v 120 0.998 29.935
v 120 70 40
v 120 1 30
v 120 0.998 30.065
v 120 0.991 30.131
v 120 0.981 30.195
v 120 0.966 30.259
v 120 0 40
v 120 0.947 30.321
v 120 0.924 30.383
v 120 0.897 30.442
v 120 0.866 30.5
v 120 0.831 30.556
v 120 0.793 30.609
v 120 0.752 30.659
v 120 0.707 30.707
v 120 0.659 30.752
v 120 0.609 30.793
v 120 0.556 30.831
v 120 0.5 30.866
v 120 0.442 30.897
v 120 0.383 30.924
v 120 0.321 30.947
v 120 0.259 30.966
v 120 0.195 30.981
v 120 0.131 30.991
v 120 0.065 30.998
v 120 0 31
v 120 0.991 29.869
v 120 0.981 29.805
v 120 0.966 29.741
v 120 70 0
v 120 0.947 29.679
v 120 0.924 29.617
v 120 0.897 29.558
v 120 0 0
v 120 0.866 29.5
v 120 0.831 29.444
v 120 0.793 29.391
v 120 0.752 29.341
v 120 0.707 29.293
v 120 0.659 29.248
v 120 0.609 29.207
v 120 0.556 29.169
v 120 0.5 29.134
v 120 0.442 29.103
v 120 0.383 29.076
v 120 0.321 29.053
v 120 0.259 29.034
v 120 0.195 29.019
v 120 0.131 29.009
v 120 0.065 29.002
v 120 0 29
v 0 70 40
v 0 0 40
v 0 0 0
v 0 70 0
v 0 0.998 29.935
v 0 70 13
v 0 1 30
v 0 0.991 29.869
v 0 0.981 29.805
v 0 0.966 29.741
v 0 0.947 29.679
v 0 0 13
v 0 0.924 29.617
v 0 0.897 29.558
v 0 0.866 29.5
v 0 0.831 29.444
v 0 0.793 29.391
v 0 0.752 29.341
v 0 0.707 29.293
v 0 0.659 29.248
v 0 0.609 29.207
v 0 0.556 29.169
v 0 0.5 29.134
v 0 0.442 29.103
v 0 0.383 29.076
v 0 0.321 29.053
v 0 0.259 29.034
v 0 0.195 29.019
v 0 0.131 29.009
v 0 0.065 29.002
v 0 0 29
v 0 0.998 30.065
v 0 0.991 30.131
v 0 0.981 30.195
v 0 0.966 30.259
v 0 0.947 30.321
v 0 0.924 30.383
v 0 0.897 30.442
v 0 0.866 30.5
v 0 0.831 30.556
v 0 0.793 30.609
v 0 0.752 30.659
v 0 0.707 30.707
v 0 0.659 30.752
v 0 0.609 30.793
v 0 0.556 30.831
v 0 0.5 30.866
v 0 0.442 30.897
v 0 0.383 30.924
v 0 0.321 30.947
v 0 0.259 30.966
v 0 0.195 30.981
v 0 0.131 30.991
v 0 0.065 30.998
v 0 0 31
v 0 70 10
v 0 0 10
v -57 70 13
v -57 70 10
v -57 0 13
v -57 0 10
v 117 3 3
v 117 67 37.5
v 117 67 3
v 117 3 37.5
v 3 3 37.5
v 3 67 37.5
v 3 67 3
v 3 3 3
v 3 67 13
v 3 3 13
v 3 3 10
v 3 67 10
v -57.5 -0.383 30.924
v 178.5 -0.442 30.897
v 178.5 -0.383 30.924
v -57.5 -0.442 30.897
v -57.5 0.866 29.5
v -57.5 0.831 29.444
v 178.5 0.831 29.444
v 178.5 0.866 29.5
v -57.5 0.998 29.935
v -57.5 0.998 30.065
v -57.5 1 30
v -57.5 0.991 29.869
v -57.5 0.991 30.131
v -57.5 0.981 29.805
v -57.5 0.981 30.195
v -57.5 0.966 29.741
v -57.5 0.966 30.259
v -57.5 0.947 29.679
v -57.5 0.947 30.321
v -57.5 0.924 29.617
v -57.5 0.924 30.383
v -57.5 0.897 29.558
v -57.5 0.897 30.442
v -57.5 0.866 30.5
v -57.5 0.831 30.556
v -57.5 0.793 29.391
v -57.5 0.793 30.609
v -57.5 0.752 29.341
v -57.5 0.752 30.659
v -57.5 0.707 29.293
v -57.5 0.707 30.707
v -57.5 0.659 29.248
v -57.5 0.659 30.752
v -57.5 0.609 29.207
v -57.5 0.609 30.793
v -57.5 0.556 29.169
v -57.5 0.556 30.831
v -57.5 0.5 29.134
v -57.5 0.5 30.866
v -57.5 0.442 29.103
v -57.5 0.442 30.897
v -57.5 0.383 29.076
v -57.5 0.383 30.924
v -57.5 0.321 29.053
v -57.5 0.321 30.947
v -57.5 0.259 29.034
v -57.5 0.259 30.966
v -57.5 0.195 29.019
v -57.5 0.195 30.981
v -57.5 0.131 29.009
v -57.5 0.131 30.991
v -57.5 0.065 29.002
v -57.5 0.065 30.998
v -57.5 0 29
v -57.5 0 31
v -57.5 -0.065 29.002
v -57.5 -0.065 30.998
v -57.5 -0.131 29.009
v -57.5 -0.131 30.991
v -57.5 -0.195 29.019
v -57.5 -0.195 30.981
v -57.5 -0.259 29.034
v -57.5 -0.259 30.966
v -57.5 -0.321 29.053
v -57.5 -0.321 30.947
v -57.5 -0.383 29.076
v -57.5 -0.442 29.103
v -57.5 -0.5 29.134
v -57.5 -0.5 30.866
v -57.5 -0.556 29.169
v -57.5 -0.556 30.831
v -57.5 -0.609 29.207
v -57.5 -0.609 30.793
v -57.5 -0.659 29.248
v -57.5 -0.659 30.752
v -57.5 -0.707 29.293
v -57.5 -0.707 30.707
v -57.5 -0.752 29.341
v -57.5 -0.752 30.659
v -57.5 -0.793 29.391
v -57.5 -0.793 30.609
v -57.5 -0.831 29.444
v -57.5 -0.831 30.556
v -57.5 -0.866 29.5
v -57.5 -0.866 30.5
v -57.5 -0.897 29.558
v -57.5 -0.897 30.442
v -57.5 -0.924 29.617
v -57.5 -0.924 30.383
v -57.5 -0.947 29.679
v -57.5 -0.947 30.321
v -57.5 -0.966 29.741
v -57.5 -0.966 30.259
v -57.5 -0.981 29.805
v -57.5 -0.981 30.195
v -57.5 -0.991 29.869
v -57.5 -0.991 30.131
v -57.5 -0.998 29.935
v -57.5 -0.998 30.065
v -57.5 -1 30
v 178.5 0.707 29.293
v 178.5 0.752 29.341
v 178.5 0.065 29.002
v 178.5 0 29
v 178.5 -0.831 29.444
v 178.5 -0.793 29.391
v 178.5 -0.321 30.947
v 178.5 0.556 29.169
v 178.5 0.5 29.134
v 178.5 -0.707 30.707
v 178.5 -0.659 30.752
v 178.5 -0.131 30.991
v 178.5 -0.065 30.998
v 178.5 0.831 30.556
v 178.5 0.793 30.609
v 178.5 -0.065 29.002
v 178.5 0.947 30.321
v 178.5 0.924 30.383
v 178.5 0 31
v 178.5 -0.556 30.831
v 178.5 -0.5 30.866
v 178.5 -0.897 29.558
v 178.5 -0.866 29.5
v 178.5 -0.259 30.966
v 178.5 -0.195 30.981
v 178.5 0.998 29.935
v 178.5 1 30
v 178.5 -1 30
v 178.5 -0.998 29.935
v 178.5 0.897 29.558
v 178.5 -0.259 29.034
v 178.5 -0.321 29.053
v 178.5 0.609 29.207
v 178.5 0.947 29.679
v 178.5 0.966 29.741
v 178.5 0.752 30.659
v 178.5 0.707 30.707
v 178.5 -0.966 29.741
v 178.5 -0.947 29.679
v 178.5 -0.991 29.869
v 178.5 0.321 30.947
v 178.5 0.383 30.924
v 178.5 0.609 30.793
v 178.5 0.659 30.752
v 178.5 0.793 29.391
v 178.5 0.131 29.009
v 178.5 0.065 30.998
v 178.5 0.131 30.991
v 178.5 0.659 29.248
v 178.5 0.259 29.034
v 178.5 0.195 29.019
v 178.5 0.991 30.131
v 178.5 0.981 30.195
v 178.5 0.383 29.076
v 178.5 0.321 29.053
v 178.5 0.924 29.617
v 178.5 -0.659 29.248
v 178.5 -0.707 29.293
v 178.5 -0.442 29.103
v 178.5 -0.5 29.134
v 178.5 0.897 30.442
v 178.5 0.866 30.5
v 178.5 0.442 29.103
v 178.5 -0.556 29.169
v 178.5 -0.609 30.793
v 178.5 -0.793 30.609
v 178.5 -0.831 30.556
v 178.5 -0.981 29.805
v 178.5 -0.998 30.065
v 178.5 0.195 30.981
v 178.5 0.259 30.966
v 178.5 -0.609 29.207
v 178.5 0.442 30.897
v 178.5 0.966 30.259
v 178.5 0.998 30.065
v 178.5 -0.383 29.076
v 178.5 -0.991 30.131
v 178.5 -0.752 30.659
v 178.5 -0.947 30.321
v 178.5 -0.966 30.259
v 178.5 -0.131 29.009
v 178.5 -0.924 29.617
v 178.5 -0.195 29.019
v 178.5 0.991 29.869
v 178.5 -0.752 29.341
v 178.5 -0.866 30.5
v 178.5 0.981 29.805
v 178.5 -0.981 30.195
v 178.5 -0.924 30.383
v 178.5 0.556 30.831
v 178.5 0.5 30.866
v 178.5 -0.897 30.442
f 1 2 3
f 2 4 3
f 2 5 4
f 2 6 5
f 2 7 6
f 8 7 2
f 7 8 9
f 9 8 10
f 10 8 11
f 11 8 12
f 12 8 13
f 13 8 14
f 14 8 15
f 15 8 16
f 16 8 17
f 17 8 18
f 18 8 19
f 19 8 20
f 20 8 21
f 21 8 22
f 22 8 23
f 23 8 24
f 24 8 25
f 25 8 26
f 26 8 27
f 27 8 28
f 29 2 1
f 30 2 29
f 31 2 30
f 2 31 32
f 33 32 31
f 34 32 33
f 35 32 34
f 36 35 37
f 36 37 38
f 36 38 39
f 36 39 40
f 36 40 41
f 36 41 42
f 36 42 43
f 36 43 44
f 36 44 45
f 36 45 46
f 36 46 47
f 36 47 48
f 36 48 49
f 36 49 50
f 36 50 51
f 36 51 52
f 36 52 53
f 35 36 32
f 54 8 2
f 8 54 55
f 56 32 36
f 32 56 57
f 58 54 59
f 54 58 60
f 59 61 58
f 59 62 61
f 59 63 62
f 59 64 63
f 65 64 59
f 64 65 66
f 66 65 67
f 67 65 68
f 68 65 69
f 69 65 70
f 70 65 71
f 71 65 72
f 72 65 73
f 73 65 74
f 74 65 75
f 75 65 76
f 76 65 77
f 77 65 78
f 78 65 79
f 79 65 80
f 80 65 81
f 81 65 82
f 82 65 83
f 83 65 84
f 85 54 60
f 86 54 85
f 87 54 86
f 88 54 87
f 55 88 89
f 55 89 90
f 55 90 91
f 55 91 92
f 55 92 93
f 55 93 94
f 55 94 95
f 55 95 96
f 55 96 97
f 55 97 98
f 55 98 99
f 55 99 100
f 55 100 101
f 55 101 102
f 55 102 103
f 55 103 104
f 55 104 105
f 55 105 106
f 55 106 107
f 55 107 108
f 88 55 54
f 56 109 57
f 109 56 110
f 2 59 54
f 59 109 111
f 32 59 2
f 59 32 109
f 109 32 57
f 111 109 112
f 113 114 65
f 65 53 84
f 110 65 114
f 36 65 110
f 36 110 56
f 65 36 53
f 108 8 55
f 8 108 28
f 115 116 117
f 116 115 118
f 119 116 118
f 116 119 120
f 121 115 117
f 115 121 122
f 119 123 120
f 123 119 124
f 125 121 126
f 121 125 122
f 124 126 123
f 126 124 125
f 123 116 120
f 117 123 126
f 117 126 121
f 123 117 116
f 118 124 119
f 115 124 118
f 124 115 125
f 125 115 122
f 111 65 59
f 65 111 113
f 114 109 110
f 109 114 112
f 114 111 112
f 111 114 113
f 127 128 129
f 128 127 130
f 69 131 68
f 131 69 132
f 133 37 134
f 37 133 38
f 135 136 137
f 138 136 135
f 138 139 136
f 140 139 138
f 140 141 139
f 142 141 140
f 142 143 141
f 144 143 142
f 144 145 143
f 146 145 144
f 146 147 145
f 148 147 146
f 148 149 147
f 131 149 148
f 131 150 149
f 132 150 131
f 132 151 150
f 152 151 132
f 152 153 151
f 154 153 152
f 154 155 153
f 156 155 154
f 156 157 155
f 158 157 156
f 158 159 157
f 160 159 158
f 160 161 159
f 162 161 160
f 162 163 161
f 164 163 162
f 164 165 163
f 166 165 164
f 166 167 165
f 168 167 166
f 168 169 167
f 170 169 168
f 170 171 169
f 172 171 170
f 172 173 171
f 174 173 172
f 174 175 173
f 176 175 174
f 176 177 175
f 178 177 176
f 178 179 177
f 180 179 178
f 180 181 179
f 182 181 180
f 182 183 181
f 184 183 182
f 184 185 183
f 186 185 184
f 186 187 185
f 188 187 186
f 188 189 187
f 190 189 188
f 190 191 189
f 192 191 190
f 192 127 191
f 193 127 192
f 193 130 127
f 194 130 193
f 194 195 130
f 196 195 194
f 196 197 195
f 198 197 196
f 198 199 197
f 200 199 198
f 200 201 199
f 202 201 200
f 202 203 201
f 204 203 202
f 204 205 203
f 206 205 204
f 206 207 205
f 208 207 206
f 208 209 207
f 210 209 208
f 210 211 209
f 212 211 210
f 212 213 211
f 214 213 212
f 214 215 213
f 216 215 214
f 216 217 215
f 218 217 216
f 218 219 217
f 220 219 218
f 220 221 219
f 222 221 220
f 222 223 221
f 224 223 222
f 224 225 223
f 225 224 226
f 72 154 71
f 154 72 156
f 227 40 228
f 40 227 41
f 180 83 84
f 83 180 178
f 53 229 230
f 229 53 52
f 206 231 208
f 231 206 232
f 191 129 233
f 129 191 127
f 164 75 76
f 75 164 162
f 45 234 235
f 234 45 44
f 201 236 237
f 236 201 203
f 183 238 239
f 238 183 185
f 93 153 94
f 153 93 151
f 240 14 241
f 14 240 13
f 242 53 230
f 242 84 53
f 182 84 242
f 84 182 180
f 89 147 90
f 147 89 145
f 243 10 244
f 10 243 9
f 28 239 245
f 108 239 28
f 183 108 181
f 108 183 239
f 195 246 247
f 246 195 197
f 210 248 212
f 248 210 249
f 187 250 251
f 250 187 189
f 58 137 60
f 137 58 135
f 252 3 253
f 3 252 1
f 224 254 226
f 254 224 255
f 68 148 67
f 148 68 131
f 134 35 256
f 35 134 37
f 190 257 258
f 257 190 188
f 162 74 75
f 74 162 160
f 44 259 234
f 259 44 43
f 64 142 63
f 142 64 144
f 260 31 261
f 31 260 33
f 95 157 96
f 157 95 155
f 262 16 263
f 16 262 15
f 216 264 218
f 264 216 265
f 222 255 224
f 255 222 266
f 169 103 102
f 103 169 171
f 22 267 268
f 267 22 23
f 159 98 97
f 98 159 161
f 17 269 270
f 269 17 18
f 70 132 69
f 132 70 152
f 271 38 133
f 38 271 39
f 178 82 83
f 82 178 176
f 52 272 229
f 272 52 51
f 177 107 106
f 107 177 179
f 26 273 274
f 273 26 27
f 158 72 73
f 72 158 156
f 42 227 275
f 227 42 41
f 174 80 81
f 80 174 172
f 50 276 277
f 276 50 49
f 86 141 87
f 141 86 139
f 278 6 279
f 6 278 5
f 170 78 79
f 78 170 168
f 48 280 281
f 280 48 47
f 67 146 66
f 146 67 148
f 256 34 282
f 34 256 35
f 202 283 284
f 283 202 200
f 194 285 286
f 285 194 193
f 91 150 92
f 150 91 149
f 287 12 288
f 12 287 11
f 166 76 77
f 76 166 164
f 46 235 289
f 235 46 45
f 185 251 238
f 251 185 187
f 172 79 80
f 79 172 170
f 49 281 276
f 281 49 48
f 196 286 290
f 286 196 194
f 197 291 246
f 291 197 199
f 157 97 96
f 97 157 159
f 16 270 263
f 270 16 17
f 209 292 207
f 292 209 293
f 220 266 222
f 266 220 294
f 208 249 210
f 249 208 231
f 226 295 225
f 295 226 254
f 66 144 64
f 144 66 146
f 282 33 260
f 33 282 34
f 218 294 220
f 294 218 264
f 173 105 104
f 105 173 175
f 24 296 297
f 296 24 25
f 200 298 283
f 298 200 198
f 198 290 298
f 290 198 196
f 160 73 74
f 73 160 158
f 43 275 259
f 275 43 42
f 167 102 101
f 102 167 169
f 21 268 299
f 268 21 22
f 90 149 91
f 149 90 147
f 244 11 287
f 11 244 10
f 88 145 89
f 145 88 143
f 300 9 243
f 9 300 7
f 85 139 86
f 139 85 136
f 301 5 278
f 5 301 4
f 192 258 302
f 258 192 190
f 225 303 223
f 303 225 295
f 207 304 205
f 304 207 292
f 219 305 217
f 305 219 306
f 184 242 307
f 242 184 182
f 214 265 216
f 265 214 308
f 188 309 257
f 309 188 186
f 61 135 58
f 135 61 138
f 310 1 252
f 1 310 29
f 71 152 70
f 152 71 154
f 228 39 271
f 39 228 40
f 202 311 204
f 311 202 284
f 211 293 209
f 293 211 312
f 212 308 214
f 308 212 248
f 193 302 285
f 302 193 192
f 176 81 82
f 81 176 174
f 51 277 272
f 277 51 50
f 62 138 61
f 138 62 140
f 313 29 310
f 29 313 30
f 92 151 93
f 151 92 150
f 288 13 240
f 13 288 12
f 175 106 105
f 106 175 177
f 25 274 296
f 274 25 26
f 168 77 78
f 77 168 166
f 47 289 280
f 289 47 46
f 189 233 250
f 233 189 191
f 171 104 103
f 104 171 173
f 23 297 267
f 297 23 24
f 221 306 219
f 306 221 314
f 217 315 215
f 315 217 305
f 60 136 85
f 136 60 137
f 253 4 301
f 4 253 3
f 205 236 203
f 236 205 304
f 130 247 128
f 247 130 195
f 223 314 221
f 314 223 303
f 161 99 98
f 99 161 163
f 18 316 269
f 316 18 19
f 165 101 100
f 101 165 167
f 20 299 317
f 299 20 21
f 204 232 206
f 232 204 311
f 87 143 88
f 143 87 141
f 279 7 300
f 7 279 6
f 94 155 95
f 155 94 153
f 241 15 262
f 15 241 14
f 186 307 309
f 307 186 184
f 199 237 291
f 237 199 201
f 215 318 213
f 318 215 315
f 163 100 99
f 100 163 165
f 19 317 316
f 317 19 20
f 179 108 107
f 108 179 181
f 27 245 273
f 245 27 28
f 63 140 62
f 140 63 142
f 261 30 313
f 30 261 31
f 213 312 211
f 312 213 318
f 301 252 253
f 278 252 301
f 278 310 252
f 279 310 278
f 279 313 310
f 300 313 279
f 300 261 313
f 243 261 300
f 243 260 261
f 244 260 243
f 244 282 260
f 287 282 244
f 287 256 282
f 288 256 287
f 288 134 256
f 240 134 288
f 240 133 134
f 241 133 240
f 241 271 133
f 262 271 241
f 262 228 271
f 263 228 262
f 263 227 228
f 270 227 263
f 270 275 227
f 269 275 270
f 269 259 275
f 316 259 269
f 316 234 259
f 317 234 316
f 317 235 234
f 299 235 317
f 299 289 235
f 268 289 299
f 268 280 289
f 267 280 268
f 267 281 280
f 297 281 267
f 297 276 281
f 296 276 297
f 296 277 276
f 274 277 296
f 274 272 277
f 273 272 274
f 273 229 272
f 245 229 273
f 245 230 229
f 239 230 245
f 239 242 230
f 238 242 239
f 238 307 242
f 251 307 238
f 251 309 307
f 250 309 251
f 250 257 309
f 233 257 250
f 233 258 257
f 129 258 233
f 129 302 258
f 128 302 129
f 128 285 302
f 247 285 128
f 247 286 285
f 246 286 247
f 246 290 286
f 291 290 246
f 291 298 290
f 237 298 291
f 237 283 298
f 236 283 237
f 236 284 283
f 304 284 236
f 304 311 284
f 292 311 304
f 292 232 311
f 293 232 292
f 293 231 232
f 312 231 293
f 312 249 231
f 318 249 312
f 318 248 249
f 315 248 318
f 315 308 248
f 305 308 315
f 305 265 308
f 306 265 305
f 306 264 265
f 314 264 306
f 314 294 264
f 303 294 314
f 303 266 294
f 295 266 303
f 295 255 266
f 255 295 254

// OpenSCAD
// Mini horizontal gel-electrophoresis box - buffer tank
// Print orientation: tank resting on XY plane, open top facing up (+Z)

// ---------------- Parameters ----------------
outer_x      = 120;   // outer length in X (mm)
outer_y      = 70;    // outer width in Y (mm)
outer_z      = 40;    // outer height in Z (mm)

wall         = 3;     // wall thickness (mm)

floor        = 3;     // floor thickness under the tank (mm)

platform_x   = 60;    // platform length along X (mm), centred
platform_y   = outer_y; // platform spans full inner width (mm)

platform_top_z = 13;  // height of platform top above outer floor (mm)

hole_d       = 2;     // electrode hole diameter (mm)

hole_y       = 0;     // electrode hole Y position (mm)

hole_z       = 30;    // electrode hole Z position (mm)

eps          = 0.5;   // cutter overshoot past faces (mm)

$fn = 96;             // curve resolution

// ---------------- Derived ----------------
inner_x = outer_x - 2 * wall;   // 114 mm
inner_y = outer_y - 2 * wall;   // 64 mm
inner_z = floor + (outer_z - floor - 2 * wall); // 34 mm (space between floor and open top)

platform_bot_z = platform_top_z - wall; // 10 mm (matches user statement: top at z = 13, wall 3)

// ---------------- Model ----------------
union() {
    // Tank body: floor + side walls, open top
    difference() {
        cube([outer_x, outer_y, outer_z]);

        // Cut out the open-top inner volume (through the top face)
        translate([wall, wall, floor])
            cube([inner_x, inner_y, inner_z + eps]);
    }

    // Gel-tray platform, centred in X, spanning full inner width
    translate([-inner_x / 2, 0, platform_bot_z])
        cube([platform_x, platform_y, wall]);
}

// ---------------- Electrode holes ----------------
// Horizontal 2 mm holes along X, through each end wall, at y = 0, z = 30
for (sx = [-1, 1]) {
    translate([sx > 0 ? inner_x / 2 + eps : -inner_x / 2 - eps,
               hole_y,
               hole_z])
        rotate([0, 90, 0])
            cylinder(d = hole_d, h = outer_x + 2 * eps);
}
